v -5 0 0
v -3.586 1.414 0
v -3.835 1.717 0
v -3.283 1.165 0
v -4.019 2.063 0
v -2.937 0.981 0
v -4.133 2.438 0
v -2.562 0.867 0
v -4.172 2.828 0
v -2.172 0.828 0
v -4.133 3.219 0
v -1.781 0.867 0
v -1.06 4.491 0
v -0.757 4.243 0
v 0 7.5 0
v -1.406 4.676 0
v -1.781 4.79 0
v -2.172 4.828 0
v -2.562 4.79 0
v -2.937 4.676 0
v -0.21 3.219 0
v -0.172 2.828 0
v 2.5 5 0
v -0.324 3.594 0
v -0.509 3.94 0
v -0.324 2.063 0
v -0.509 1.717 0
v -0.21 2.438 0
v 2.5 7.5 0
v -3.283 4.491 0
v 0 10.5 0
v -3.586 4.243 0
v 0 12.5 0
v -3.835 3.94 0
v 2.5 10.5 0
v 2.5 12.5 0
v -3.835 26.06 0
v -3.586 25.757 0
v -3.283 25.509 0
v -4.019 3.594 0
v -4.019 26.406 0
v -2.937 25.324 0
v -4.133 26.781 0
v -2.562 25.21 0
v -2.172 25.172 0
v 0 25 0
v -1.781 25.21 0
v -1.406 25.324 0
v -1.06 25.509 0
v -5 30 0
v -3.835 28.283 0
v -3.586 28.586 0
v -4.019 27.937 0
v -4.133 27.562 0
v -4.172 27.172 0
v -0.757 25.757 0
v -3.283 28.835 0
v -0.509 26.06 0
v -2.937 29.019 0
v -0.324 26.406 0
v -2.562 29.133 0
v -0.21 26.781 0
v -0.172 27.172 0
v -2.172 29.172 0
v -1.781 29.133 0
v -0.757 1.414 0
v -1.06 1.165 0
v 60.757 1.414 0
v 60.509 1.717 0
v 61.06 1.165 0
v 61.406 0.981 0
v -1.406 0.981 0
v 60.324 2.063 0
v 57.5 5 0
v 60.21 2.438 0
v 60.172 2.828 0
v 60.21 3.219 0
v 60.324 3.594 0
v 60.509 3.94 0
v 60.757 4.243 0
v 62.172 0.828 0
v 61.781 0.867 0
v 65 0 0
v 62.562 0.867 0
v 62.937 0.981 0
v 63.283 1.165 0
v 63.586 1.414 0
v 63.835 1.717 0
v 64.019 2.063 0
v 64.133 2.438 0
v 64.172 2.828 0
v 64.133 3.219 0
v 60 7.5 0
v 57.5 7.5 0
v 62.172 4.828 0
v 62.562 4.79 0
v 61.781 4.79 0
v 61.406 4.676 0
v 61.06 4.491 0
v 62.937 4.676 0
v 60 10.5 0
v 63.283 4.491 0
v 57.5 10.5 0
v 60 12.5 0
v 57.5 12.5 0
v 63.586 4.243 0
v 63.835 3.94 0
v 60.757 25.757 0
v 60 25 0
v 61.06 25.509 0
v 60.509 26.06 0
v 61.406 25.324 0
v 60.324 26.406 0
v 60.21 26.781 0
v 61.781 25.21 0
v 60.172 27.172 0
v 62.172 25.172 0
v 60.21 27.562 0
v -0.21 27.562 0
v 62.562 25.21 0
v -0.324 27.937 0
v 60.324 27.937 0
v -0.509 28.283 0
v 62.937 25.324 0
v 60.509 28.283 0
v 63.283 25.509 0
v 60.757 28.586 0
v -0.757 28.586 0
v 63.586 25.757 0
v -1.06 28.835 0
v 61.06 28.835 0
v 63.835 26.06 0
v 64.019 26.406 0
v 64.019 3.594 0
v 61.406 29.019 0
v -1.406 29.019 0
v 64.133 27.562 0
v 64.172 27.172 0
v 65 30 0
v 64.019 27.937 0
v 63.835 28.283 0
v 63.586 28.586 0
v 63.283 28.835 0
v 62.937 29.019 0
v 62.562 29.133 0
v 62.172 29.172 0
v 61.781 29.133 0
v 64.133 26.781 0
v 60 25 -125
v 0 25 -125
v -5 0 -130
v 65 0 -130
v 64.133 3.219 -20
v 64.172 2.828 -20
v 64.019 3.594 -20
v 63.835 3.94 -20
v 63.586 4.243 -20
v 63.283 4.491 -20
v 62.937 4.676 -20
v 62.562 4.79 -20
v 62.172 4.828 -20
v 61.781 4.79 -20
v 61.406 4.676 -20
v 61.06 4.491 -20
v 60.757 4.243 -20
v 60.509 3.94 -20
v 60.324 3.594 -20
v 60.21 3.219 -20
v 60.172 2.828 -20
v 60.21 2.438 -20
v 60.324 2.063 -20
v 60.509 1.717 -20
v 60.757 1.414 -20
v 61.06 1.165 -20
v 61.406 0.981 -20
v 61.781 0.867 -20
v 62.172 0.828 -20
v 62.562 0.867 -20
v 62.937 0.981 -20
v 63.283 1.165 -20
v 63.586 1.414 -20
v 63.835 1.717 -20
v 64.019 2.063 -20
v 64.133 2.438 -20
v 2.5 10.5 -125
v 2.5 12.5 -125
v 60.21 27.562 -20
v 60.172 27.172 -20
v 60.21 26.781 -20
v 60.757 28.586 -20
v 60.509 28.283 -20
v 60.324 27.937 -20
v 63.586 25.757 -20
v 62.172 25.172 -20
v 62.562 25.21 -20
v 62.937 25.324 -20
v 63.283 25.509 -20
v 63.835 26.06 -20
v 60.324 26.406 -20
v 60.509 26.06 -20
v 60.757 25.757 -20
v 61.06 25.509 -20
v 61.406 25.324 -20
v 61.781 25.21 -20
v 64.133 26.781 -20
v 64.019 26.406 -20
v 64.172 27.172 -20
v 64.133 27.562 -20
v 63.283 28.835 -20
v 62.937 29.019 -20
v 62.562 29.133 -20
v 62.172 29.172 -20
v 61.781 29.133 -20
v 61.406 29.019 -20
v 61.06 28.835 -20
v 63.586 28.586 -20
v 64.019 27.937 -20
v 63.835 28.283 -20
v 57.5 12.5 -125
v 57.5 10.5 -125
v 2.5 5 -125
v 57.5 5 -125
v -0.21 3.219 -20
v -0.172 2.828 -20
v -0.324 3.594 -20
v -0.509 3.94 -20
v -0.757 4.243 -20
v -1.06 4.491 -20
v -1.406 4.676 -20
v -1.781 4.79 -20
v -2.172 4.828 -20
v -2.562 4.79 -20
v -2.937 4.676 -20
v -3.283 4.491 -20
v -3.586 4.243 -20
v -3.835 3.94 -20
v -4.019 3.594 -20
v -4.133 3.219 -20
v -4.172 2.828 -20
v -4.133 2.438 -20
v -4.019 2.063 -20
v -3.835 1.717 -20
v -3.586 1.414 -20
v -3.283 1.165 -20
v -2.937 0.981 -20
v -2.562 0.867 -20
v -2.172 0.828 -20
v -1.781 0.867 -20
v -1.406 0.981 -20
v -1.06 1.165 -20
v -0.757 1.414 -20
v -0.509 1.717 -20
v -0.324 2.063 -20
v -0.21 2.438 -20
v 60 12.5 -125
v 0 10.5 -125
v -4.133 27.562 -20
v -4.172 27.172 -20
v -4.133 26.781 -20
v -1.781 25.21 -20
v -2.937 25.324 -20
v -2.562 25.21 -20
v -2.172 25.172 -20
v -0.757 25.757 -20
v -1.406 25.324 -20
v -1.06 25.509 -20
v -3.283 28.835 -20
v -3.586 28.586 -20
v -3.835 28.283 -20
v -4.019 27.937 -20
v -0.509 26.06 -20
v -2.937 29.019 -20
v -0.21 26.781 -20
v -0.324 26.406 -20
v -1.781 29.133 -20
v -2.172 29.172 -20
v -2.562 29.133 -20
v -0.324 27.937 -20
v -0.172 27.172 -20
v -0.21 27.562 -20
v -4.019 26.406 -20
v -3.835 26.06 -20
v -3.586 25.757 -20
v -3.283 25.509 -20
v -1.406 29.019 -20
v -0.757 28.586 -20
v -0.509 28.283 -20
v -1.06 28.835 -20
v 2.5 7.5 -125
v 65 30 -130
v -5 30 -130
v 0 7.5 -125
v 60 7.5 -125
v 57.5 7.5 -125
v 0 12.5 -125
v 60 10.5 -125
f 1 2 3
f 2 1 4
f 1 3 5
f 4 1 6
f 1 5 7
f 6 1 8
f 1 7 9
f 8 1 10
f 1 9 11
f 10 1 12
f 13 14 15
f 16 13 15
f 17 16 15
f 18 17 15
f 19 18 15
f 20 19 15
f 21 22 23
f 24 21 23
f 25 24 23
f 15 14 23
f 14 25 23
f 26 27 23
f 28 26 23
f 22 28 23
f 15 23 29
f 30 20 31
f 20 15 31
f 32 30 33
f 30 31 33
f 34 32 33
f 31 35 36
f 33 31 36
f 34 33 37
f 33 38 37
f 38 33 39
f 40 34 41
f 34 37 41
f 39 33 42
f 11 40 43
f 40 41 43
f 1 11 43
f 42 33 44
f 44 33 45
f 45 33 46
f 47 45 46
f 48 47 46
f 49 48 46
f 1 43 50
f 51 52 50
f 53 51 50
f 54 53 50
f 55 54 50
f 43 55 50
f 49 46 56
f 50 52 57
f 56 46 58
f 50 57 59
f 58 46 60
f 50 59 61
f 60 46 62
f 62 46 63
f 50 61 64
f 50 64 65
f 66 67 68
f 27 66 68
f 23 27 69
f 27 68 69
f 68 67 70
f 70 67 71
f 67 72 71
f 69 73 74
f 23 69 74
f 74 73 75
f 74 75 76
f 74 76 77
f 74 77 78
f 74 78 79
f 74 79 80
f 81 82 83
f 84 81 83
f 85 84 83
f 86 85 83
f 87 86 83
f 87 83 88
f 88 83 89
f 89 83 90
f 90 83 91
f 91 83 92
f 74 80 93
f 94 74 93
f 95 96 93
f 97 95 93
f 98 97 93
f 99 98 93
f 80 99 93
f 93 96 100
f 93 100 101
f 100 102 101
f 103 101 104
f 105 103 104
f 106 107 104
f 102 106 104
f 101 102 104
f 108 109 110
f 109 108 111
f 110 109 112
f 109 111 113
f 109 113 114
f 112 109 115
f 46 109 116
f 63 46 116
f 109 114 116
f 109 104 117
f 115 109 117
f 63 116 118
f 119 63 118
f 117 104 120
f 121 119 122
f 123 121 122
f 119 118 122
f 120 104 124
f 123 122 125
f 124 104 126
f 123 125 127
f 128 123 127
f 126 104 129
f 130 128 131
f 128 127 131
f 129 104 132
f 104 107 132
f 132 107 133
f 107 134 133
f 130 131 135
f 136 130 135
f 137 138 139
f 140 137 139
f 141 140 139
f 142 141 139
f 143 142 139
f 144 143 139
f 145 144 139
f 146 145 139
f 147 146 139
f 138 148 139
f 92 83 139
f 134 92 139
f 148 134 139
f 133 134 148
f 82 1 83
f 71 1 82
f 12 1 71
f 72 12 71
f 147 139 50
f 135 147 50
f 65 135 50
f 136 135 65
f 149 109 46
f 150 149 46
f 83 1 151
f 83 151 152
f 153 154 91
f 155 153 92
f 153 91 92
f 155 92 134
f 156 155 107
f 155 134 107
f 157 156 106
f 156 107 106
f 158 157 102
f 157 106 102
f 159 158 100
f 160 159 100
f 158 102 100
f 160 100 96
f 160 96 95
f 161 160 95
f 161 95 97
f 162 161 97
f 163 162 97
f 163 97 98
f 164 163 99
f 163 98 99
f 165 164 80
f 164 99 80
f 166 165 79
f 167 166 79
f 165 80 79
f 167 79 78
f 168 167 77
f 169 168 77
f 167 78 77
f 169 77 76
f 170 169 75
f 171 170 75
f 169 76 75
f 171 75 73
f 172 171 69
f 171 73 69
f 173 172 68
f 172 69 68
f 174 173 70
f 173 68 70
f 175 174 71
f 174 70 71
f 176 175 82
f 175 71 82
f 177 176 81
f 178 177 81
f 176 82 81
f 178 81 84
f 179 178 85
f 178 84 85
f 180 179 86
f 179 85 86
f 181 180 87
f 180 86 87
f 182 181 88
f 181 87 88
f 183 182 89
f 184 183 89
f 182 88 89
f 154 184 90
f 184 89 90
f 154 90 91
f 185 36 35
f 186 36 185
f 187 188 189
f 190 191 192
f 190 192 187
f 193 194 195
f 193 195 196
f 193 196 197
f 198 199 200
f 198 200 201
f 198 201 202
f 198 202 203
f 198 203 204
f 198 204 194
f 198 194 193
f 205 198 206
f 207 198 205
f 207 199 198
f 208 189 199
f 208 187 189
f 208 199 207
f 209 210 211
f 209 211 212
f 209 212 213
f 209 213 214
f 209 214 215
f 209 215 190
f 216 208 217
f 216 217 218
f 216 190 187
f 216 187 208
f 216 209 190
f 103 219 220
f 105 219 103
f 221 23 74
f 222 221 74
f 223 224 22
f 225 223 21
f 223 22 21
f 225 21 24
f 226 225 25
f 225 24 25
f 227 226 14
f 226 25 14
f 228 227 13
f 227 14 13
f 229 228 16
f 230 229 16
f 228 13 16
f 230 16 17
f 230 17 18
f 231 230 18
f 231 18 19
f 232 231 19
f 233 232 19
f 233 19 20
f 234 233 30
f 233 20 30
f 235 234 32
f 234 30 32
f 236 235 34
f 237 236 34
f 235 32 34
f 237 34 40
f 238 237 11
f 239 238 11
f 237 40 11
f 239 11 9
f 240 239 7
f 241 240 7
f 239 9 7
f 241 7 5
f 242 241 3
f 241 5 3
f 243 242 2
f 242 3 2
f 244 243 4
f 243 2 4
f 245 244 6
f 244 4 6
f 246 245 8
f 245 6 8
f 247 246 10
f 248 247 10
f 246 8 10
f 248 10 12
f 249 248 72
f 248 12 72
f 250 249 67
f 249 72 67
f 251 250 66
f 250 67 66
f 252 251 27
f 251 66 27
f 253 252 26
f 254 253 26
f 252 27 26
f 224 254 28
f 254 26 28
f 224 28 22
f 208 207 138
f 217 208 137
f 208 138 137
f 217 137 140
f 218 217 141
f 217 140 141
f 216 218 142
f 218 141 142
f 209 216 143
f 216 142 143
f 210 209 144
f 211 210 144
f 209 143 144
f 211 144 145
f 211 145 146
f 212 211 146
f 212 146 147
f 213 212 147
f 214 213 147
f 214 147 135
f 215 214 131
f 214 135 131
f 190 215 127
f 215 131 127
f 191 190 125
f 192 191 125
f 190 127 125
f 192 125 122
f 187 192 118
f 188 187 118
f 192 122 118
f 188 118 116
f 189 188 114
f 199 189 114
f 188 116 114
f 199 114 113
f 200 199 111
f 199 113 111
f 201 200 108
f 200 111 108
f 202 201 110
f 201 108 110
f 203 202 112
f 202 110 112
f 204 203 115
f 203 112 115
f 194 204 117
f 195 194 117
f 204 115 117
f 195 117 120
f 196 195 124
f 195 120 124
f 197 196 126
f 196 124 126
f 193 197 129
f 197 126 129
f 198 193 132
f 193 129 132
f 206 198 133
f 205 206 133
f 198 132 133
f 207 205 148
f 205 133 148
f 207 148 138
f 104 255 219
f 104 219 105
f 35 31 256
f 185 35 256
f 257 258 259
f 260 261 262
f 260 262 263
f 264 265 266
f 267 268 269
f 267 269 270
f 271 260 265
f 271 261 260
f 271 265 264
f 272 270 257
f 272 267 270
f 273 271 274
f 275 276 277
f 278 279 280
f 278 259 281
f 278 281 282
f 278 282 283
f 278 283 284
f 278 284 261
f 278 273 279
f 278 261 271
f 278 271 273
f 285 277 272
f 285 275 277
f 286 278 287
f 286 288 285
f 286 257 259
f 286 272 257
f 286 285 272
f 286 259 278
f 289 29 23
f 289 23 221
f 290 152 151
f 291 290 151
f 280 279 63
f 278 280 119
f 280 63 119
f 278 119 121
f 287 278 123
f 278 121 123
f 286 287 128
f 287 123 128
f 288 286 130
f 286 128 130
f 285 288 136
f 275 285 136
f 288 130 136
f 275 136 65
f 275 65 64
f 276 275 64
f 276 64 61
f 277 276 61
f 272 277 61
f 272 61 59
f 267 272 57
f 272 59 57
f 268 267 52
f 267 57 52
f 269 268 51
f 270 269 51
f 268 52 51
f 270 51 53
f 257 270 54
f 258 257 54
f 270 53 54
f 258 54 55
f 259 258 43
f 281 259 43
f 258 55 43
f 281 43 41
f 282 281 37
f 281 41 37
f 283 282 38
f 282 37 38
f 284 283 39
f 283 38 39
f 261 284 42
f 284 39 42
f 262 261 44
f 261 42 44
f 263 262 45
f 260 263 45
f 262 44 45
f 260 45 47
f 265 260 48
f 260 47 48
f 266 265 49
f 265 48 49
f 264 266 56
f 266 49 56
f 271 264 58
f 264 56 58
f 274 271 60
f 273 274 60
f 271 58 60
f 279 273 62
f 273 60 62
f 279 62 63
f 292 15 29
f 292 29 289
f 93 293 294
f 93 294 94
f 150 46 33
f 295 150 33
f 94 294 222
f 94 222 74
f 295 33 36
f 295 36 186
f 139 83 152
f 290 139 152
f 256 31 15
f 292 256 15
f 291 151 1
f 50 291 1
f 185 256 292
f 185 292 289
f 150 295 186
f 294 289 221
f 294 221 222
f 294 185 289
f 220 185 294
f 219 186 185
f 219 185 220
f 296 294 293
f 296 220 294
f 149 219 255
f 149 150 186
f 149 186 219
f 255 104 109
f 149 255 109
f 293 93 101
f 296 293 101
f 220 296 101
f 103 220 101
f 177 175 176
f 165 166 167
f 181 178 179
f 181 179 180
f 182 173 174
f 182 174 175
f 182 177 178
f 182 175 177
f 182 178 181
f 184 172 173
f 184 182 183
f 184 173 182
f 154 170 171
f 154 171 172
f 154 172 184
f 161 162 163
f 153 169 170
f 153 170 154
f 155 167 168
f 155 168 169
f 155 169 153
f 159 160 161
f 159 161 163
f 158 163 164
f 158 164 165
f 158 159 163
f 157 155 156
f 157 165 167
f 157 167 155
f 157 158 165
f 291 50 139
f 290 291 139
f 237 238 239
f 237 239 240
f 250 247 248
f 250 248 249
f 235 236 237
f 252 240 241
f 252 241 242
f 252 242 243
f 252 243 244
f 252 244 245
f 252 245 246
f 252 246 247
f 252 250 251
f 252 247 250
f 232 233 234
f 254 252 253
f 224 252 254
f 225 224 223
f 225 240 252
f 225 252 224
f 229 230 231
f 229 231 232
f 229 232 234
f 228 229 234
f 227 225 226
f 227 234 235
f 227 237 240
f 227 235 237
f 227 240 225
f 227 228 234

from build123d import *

# Parameters (mm, degrees)
BOSS_EXTRUDE2_DEPTH = 30
CUT_EXTRUDE1_DEPTH  = 125
SKETCH4_W           = 125
SKETCH4_H           = 2
SKETCH4_H_2         = 2.5
BOSS_EXTRUDE4_DEPTH = 2.5
SKETCH5_W           = 125
SKETCH5_H           = 2.5
SKETCH5_H_2         = 2
BOSS_EXTRUDE5_DEPTH = 2.5
SKETCH6_R           = 2
CUT_EXTRUDE2_DEPTH  = 20


with BuildPart() as part:
    # Sketch1 → Boss-Extrude2 (new body)
    with BuildSketch(Plane(origin=(0, 0, 0), x_dir=(1, 0, 0), z_dir=(0, 1, 0))):
        Polygon((-5, 130), (-5, 0), (0, 0), (65, 0), (65, 130), align=None)
    extrude(amount=BOSS_EXTRUDE2_DEPTH)

    # Sketch3 → Cut-Extrude1 (cut)
    with BuildSketch(Plane.XY):
        Polygon((24.738126678, 25), (0, 25), (0, 5), (60, 5), (60, 25), align=None)
    extrude(amount=-CUT_EXTRUDE1_DEPTH, mode=Mode.SUBTRACT)

    # Sketch4 → Boss-Extrude4 (add)
    with BuildSketch(Plane(origin=(0, 0, 0), x_dir=(0, 0, -1), z_dir=(1, 0, 0))):
        with Locations((62.5, 11.5)):
            Rectangle(SKETCH4_W, SKETCH4_H)
        with Locations((62.5, 6.25)):
            Rectangle(SKETCH4_W, SKETCH4_H_2)
    extrude(amount=BOSS_EXTRUDE4_DEPTH)

    # Sketch5 → Boss-Extrude5 (add)
    with BuildSketch(Plane.ZY.offset(-60)):
        with Locations((-62.5, 6.25)):
            Rectangle(SKETCH5_W, SKETCH5_H)
        with Locations((-62.5, 11.5)):
            Rectangle(SKETCH5_W, SKETCH5_H_2)
    extrude(amount=BOSS_EXTRUDE5_DEPTH)

    # Sketch6 → Cut-Extrude2 (cut)
    with BuildSketch(Plane.XY):
        with Locations((-2.171572875, 27.171572875)):
            Circle(SKETCH6_R)
        with Locations((62.171572875, 27.171572875)):
            Circle(SKETCH6_R)
        with Locations((62.171572875, 2.828427125)):
            Circle(SKETCH6_R)
        with Locations((-2.171572875, 2.828427125)):
            Circle(SKETCH6_R)
    extrude(amount=-CUT_EXTRUDE2_DEPTH, mode=Mode.SUBTRACT)


solid = part.part
